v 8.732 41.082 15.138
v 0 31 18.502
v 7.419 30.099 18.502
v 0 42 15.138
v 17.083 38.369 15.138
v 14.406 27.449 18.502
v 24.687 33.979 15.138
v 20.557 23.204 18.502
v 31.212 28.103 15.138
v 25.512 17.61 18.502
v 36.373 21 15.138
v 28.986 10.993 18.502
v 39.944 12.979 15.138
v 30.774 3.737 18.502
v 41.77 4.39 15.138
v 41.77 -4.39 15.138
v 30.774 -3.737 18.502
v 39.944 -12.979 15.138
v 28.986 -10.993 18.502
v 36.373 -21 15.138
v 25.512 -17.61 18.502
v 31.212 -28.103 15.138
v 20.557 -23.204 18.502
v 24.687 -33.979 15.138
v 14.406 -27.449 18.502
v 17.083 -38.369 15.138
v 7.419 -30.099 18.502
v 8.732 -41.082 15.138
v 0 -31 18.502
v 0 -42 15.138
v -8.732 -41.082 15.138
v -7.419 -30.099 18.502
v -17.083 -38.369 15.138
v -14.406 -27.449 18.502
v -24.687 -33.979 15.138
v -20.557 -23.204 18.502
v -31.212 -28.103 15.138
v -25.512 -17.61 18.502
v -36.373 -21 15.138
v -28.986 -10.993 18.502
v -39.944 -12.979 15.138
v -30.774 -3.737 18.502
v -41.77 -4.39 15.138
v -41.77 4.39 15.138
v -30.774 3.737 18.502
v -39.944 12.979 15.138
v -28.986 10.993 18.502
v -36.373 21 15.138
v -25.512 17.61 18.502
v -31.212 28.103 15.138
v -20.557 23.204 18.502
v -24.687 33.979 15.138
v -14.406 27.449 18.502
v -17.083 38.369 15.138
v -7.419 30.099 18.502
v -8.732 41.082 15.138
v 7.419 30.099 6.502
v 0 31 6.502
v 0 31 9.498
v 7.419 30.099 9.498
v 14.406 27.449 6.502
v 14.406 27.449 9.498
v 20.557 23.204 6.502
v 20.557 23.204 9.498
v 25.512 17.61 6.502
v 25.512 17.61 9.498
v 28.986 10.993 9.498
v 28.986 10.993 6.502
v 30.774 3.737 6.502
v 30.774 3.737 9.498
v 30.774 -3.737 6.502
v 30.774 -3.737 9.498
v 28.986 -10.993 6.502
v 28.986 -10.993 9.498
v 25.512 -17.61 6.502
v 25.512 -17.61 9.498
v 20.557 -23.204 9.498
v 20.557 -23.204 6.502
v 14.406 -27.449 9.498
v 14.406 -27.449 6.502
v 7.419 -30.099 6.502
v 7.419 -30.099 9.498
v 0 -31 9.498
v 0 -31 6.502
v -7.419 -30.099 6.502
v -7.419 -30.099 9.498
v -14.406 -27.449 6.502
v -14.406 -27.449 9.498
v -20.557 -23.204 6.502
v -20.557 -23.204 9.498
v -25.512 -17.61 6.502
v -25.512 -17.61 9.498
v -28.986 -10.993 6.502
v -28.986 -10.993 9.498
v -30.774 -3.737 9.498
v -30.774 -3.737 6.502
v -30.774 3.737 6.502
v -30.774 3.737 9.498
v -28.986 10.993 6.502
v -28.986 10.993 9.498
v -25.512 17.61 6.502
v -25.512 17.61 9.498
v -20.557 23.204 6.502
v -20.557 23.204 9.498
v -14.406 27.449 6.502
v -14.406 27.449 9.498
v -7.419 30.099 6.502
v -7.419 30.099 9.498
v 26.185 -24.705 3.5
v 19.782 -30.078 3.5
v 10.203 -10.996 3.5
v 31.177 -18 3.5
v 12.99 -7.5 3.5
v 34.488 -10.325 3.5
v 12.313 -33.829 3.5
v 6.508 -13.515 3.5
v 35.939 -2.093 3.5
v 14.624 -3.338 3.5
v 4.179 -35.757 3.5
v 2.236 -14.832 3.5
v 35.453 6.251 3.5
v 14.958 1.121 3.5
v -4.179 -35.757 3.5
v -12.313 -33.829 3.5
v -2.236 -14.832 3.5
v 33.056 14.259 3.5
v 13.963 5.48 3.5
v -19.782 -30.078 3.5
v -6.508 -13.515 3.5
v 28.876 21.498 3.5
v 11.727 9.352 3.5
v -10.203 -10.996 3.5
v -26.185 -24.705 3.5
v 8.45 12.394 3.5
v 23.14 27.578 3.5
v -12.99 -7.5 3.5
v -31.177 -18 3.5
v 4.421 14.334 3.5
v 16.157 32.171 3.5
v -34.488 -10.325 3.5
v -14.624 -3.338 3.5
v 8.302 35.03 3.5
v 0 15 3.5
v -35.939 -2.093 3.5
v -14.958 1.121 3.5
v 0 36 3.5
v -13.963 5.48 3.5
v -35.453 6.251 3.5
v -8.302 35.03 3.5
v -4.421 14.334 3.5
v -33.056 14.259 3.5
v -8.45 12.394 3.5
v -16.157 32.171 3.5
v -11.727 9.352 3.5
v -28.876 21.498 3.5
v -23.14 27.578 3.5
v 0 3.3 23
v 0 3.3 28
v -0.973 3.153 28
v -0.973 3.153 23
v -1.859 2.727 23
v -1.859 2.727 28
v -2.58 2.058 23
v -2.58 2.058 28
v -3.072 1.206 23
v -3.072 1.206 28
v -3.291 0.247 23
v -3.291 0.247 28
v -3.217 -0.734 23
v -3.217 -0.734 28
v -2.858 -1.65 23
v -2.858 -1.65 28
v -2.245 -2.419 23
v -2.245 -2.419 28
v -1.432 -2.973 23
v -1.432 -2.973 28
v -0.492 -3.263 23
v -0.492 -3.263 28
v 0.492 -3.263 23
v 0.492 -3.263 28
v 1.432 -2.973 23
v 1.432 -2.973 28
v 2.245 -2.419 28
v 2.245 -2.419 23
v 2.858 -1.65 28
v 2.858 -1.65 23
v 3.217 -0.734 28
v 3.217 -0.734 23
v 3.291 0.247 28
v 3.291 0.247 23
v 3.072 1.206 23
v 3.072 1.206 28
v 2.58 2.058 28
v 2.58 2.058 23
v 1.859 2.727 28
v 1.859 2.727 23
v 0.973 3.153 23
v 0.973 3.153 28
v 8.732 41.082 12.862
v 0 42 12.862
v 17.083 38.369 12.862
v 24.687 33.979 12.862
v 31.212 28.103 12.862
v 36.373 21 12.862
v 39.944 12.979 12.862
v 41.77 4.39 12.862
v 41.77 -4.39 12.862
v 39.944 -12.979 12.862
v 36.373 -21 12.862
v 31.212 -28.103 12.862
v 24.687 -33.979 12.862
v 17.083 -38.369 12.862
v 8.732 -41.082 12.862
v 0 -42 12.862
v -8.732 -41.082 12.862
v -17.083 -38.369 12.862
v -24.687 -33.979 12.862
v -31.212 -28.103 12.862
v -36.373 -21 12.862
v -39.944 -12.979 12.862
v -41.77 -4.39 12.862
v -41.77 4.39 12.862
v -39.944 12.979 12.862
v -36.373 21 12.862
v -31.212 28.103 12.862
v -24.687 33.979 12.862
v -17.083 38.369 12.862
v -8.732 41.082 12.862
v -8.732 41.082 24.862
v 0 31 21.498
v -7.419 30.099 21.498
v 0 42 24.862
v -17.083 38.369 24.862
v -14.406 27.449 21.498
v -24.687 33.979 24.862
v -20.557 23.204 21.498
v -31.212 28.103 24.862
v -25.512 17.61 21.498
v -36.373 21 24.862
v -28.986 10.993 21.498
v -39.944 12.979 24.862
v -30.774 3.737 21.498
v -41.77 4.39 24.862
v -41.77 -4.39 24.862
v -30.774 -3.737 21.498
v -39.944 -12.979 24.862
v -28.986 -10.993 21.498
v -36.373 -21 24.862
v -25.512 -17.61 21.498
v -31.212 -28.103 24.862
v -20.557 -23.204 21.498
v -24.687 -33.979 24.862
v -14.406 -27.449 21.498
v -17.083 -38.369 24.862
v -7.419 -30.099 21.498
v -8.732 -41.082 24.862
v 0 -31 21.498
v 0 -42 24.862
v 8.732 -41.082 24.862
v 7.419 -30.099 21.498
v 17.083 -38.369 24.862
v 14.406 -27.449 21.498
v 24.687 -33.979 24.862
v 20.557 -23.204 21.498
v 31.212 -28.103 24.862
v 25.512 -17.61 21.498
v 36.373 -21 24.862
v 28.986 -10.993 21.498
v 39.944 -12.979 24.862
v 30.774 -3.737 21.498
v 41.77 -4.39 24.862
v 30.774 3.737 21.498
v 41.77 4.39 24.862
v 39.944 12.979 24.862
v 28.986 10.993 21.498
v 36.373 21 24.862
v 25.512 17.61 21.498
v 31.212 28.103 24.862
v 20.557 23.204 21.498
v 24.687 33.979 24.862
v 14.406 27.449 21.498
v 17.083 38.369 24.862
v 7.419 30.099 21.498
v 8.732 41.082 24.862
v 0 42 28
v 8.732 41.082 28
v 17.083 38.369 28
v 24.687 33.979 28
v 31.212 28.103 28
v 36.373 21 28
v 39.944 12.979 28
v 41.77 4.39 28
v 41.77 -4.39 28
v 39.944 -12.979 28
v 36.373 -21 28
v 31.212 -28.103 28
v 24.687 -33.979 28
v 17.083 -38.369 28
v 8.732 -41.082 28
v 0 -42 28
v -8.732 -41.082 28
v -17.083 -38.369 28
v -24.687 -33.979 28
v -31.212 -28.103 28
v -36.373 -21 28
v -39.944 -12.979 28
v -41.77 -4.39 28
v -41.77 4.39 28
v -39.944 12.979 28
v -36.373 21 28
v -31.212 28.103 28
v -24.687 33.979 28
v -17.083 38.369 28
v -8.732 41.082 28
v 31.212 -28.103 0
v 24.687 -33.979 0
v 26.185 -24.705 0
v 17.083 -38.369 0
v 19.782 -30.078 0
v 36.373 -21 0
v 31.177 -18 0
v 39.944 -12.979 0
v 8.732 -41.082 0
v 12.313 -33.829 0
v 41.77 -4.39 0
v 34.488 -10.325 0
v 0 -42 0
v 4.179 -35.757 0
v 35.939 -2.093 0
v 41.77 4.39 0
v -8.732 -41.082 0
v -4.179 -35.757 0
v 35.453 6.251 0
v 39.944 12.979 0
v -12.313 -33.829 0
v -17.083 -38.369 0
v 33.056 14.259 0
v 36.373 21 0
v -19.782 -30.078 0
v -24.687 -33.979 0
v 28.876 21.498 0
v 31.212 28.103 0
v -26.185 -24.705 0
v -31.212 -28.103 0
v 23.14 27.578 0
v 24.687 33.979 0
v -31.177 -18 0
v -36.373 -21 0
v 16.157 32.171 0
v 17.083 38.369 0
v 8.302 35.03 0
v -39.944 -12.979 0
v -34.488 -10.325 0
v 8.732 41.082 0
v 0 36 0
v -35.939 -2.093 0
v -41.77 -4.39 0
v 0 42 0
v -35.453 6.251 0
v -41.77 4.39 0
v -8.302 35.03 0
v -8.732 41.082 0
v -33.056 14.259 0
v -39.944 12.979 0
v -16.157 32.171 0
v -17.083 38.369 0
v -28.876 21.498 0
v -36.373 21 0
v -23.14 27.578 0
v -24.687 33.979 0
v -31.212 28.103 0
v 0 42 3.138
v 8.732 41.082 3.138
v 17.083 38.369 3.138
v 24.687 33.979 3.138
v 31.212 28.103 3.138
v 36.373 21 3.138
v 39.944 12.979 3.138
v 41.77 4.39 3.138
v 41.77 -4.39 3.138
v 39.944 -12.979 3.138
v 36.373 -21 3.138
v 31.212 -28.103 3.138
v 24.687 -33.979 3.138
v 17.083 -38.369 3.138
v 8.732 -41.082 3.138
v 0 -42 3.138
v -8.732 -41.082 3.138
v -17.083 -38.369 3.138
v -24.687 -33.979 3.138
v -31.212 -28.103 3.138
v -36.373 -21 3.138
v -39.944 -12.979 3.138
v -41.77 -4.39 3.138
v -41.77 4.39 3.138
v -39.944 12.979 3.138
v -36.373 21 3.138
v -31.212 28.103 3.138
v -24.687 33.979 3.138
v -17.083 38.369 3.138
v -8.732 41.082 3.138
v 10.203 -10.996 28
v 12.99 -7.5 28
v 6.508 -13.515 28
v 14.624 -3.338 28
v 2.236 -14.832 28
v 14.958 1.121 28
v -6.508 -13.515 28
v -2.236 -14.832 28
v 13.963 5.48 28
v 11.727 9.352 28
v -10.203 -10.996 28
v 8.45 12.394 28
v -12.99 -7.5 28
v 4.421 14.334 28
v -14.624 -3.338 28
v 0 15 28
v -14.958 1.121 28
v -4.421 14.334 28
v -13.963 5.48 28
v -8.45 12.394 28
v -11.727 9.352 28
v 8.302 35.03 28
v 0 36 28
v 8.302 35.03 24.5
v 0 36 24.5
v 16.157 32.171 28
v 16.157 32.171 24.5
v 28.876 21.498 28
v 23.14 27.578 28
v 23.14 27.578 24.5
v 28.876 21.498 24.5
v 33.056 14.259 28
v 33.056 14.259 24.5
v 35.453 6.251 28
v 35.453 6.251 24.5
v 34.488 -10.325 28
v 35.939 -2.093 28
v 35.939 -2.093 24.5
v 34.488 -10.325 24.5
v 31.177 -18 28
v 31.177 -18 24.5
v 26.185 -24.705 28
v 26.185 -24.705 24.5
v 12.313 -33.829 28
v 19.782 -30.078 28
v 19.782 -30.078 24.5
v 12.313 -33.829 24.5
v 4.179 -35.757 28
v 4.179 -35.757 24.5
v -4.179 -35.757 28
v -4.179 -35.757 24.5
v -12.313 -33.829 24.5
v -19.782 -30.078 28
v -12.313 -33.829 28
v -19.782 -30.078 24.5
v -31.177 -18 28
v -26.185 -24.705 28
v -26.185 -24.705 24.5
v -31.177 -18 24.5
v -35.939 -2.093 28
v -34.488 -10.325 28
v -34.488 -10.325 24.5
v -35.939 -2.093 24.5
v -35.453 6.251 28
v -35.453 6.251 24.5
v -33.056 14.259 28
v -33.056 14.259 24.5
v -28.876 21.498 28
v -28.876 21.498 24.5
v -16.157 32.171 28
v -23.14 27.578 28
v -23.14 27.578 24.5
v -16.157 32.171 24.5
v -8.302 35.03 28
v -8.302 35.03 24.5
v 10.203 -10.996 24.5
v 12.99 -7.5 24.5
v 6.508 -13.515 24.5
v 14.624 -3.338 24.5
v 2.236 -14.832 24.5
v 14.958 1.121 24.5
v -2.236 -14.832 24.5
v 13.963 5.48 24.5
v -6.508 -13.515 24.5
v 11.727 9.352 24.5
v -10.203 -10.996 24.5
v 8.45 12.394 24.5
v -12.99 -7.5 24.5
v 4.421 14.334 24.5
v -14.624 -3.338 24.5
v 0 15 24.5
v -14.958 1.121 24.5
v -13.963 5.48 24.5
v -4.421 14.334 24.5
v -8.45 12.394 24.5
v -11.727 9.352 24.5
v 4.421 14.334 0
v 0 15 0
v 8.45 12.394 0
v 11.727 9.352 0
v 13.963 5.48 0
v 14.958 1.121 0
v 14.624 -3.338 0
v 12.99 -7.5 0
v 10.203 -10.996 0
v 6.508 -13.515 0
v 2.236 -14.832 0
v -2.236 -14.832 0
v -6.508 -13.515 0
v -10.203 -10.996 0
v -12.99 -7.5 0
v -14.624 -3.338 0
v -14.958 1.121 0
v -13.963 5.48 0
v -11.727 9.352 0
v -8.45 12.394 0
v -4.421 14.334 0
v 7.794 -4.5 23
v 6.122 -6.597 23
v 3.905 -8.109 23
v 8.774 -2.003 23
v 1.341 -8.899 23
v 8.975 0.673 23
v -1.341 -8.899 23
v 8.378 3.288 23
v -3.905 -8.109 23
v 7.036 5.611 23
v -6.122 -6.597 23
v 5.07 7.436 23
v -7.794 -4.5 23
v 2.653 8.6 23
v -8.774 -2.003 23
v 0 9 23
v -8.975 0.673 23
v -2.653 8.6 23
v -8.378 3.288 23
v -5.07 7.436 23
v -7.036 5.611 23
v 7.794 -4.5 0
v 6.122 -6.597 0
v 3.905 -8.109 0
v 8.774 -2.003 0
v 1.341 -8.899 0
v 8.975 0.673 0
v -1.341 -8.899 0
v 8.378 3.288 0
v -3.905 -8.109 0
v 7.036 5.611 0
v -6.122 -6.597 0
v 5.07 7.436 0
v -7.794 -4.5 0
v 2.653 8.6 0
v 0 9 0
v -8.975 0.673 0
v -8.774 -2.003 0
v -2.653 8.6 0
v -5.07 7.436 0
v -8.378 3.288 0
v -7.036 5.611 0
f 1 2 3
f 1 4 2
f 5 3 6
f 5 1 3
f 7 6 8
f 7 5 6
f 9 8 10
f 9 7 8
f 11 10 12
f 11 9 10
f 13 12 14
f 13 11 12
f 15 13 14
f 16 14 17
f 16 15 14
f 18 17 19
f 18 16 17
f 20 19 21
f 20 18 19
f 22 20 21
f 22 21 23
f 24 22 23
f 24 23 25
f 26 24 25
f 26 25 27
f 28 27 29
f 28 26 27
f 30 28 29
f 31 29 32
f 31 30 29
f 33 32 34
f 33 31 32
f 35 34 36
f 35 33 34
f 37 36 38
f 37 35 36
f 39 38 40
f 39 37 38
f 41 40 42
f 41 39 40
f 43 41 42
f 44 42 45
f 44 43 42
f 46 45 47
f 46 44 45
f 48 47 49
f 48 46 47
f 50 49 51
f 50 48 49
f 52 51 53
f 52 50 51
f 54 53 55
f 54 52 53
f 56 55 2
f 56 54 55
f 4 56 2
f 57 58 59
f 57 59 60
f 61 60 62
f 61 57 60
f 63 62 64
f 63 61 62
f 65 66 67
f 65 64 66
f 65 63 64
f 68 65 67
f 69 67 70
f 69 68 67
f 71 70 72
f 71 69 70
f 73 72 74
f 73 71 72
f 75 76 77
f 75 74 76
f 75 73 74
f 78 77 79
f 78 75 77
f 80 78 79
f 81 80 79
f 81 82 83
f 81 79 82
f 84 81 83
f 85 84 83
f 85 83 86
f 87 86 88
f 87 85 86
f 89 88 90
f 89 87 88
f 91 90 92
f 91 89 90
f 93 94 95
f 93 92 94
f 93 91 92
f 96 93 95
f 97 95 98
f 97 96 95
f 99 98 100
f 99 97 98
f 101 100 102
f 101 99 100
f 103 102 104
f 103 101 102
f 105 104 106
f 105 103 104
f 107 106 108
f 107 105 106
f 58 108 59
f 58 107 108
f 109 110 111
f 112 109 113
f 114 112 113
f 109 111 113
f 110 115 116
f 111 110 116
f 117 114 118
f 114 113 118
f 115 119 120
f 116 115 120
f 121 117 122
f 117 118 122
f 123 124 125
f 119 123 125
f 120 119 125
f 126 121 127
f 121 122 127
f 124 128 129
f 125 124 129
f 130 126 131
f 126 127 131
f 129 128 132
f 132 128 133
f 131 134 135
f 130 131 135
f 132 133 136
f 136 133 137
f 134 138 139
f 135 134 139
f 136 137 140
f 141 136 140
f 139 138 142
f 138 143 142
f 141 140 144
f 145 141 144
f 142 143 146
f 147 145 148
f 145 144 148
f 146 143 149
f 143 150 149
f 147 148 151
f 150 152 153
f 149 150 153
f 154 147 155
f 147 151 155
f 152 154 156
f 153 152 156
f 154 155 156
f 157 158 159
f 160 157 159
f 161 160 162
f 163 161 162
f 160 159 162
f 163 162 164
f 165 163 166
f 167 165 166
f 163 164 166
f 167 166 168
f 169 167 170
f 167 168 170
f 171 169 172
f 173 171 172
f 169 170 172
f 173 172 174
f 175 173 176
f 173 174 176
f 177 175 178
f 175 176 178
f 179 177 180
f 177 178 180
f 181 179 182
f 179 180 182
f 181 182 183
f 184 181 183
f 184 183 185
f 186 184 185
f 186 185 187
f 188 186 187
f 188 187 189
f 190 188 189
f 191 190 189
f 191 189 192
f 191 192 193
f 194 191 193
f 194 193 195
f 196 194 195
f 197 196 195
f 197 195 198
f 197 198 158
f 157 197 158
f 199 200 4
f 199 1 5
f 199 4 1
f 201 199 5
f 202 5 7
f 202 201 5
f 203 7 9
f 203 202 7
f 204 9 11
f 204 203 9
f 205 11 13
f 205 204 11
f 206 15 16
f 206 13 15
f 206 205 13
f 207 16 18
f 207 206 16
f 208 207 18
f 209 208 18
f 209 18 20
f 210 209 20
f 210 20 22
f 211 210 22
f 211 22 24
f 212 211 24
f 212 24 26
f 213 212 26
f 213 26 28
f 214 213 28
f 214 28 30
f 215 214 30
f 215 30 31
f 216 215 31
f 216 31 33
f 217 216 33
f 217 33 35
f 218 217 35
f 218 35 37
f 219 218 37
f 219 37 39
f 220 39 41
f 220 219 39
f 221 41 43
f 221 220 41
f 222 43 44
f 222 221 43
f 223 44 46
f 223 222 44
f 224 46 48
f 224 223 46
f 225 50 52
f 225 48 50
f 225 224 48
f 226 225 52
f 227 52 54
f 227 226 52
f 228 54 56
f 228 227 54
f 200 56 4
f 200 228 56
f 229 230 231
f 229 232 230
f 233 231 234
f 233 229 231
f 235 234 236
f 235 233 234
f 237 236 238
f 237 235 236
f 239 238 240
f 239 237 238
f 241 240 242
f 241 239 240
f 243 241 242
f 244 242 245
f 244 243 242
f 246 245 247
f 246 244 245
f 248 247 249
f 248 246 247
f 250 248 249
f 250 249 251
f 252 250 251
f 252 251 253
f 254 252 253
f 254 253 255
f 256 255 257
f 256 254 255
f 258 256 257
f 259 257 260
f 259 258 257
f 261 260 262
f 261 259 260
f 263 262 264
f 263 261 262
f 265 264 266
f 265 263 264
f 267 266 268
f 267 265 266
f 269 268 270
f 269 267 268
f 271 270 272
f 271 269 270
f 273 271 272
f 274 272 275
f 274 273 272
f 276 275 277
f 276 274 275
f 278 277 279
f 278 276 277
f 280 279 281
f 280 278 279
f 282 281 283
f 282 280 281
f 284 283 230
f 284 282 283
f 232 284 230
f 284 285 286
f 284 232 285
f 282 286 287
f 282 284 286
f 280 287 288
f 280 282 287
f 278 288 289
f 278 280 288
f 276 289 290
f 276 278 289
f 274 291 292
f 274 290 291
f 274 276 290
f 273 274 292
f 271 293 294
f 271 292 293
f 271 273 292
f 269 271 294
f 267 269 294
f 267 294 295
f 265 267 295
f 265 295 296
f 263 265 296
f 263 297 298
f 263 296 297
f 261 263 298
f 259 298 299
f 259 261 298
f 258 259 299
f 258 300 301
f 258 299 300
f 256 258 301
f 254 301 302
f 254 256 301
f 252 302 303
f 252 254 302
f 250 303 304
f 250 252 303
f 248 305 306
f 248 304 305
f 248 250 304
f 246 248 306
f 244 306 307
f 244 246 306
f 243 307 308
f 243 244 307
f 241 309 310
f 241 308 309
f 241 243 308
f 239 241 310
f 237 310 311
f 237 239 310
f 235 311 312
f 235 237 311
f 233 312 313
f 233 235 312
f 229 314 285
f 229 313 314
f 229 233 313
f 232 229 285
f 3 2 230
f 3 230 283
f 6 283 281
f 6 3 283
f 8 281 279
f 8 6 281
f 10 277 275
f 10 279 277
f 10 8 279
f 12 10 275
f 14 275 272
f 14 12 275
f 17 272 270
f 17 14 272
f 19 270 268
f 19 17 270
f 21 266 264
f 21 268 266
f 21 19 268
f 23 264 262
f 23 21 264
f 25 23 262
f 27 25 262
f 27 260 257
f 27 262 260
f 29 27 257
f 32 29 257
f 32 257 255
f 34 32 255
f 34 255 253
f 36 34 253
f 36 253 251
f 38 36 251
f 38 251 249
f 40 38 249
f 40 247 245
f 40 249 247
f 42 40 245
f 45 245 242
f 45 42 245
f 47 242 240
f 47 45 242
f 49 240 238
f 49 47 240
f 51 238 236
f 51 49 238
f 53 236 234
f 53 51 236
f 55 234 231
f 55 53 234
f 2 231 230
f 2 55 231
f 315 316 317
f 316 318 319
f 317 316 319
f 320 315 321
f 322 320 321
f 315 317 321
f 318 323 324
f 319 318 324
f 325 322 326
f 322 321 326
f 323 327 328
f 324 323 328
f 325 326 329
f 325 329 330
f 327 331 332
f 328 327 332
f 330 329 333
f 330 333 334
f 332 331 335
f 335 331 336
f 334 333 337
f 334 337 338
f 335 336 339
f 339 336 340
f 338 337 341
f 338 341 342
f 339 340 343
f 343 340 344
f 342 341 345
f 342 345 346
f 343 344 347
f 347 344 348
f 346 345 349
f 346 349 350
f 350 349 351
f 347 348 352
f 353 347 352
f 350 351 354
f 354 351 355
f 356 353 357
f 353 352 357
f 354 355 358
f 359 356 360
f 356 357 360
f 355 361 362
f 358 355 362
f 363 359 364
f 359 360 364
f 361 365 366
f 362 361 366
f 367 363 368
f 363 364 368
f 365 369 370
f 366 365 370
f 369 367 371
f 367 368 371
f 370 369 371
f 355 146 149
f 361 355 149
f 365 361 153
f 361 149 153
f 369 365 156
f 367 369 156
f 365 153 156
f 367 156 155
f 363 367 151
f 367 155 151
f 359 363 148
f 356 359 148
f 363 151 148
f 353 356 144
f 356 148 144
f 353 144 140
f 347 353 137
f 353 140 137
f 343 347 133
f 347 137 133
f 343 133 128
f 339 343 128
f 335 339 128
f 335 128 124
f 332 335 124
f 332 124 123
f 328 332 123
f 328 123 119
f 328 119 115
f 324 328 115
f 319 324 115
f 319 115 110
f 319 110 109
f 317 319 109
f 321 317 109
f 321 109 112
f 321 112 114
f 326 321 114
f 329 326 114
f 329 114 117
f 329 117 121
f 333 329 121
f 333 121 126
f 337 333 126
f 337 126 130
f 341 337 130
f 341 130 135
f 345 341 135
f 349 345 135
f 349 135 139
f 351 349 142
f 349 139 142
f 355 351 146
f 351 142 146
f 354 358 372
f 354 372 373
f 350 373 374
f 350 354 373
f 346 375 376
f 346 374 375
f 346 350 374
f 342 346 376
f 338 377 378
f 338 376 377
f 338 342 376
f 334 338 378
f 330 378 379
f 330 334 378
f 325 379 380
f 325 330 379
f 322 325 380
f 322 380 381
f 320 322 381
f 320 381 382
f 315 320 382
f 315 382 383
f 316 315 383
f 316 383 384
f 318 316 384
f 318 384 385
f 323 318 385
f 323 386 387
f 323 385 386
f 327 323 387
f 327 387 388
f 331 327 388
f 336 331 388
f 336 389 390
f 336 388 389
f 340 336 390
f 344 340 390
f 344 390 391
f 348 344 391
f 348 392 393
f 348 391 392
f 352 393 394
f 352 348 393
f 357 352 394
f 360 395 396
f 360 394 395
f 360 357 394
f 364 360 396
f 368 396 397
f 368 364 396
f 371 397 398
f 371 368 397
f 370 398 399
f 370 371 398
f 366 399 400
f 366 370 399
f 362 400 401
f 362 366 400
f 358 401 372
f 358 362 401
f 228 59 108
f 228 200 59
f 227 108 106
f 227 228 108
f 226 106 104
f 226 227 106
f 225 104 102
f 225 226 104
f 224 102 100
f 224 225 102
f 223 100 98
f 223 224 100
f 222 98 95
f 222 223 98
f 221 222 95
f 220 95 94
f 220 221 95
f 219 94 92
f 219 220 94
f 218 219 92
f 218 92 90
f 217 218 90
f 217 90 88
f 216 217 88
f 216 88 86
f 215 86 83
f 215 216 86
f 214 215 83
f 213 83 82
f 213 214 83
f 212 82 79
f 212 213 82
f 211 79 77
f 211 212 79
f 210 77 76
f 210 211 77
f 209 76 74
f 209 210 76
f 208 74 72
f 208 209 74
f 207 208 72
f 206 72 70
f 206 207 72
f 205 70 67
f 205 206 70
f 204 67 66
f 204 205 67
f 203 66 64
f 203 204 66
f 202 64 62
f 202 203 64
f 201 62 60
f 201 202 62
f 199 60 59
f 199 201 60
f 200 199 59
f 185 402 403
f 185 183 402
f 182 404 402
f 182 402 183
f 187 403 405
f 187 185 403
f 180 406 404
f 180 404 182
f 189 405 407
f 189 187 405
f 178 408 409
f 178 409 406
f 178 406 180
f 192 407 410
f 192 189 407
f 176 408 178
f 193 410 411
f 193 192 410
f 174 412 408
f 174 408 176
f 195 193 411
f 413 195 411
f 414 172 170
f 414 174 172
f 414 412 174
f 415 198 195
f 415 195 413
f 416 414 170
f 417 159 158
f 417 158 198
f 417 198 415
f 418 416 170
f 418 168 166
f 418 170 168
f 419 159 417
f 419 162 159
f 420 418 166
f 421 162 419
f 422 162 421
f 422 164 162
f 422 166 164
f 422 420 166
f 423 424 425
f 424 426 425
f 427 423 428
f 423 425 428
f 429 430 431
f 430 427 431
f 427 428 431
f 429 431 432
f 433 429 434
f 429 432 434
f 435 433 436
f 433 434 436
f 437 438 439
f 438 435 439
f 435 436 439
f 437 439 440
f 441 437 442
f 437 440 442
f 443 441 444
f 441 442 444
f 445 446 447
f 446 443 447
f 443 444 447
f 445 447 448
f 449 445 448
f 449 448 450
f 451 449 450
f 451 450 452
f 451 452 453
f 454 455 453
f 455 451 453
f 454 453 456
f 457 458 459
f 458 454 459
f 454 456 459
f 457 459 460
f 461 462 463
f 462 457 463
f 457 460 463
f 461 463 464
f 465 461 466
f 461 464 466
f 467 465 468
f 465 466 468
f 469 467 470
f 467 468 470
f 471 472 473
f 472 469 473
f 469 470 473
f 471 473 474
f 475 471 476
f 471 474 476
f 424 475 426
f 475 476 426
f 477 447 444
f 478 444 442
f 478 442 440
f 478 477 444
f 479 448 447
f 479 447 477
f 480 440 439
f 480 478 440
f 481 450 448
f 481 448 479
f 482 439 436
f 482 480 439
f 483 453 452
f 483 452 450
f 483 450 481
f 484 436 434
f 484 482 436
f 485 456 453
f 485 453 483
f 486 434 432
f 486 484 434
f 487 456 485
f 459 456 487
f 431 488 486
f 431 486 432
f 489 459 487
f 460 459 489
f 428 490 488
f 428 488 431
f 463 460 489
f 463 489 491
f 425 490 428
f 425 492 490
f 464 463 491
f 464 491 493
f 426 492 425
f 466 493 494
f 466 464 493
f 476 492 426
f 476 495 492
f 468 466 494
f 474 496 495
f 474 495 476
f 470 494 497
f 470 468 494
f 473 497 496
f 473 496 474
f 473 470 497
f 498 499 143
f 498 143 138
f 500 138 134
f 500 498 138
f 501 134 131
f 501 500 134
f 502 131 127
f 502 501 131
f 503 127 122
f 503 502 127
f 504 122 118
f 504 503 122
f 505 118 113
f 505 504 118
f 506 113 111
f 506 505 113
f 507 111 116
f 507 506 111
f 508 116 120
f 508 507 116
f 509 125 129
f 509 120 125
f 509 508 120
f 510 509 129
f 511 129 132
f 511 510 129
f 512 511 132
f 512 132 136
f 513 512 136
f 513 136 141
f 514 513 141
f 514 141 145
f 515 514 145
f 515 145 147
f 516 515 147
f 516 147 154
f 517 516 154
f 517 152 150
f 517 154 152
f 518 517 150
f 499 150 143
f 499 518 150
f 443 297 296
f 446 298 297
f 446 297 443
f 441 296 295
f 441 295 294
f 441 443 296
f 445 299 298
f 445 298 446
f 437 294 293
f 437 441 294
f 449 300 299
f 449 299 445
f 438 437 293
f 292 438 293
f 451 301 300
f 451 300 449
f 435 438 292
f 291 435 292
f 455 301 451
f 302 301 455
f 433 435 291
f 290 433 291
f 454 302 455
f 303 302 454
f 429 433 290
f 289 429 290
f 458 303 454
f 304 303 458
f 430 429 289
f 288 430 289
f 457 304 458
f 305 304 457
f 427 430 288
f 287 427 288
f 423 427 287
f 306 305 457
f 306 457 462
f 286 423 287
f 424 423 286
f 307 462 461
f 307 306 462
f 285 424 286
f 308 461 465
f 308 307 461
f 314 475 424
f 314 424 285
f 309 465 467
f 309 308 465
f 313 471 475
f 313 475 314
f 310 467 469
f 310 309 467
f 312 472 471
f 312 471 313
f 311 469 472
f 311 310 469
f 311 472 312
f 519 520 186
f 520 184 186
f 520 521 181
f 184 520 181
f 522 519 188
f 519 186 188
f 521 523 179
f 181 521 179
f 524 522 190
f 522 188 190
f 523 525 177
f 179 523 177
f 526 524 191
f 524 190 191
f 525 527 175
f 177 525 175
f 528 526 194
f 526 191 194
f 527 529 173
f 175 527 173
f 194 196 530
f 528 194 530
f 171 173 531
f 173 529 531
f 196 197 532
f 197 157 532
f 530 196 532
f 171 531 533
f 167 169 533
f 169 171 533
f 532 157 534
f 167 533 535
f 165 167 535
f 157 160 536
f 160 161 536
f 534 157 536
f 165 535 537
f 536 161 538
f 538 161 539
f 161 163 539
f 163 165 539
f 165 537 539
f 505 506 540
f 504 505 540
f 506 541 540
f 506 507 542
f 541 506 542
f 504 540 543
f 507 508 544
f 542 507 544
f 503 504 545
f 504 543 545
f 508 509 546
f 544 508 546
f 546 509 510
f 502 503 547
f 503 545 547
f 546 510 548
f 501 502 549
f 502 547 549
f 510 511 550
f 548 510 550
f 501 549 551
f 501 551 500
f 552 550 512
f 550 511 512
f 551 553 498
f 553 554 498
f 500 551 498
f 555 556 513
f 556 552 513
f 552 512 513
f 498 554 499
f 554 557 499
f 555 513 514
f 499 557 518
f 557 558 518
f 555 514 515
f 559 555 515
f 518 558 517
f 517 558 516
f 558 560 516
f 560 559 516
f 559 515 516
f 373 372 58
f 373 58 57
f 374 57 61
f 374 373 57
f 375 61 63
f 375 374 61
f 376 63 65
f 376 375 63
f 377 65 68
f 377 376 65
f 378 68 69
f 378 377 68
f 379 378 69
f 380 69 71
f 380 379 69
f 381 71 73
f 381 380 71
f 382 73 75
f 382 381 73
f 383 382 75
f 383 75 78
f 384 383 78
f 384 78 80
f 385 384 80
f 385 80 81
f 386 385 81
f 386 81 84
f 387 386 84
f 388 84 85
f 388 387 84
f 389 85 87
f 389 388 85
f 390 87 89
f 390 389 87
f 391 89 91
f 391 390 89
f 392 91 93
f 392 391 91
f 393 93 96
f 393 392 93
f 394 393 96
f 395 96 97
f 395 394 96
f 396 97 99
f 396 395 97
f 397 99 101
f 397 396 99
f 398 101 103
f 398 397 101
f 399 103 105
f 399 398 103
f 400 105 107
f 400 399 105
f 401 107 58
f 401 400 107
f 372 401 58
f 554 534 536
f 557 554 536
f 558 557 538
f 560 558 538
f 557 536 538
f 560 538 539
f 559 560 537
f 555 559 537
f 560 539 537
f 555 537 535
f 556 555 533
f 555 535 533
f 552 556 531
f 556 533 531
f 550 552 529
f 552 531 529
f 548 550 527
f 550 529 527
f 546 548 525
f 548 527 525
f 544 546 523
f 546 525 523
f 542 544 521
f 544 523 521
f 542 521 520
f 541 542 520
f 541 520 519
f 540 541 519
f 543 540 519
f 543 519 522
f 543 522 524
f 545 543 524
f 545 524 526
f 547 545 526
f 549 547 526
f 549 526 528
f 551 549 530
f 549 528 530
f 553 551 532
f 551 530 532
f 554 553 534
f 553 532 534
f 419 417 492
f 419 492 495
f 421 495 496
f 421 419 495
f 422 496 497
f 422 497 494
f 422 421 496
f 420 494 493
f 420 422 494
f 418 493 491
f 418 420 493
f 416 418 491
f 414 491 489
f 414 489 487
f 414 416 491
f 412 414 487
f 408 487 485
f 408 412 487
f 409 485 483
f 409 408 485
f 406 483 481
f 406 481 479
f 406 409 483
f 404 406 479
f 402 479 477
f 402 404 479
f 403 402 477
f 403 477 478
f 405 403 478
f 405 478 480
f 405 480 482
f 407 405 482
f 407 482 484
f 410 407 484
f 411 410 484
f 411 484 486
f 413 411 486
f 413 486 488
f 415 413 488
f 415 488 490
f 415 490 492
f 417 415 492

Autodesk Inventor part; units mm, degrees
ref_plane "YZ Plane" through (0, 0, 0) normal (1, 0, 0) x (0, 1, 0)
ref_plane "XZ Plane" through (0, 0, 0) normal (0, 1, 0) x (-1, 0, 0)
sketch "Main Sketch" plane through (0, 0, 0) normal (1, 0, 0) x (0, 1, 0)
  line L0 (0, 28) -> (42, 28)
  line L1 (42, 28) -> (42, 12.8615)
  line L2 (42, 12.8615) -> (31, 9.4984)
  line L3 (31, 9.4984) -> (31, 6.5016)
  line L4 (31, 6.5016) -> (42, 3.1385)
  line L5 (42, 3.1385) -> (42, 0)
  line L6 (42, 0) -> (0, 0)
  line L7 (40, 12.25) -> (40, 3.75) construction
  line L8 (31, 8) -> (40, 8) construction
  line L9 (42, 12.8615) -> (42, 3.1385)
  line L10 (0, -5.6) -> (0, 33.6) projected
  line L11 (0, 0) -> (0, 28)
  line L12 (36, 0) -> (36, 3.5)
  line L13 (36, 3.5) -> (15, 3.5)
  line L14 (15, 3.5) -> (15, 0)
  line L15 (36, 28) -> (36, 24.5)
  line L16 (36, 24.5) -> (15, 24.5)
  line L17 (15, 24.5) -> (15, 28)
  dimension "d0" = 8.5
  dimension "d1" = 34
  dimension "d2" = 2
  dimension "d6" = 28
  dimension "d21" = 80
  dimension "d25" = 11
  dimension "d27" = 8
  dimension "d35" = 6
  dimension "d36" = 15
  dimension "d37" = 3.5
ref_plane "Belt Plane" through (0, 31, 8) normal (0, 0, 1) x (1, 0, 0)
revolve "Body" add sketch "Main Sketch" angle 360 about axis through (0, 0, -10) along (0, 0, 1) contours L0 L17 L16 L15 L1 L2 L3 L4 L5 L6 L12 L13 L14 L10 | L9 L4 L3 L2
revolve "Groove" cut sketch "Main Sketch" angle 360 about axis through (0, 0, -10) along (0, 0, 1) contours L9 L4 L3 L2
fillet "Fillet External" [suppressed]
fillet "Fillet Internal" [suppressed]
pattern_linear "Groove Pattern" count 2 spacing 12 along (0, 0, 1) of "Groove"
sketch "Sketch2" plane through (0, 0, 0) normal (0, 0, -1) x (-1, 0, 0)
  circle A0 centre (0, 0) radius 42 projected
hole "Hole1" at (0, 0, 0) direction (0, 0, 1) diameter 6.6 end through all counterbore diameter 18 counterbore depth 23
equation "\"d0\" = da_Bw"
equation "\"d1\" = da_Alfa"
equation "\"d2\" = da_c"
equation "\"d21\" = da_Dw"
equation "\"d25\" = da_Hd"
equation "\"d27\" = da_Se"
equation "\"da_r1\" = 0"
equation "\"da_r2\" = 0"
equation "\"d18\" = da_Sg"
equation "\"d5\" = da_Se"
equation "\"da_Bw\" = 8.5"
equation "\"da_Alfa\" = 34deg"
equation "\"da_c\" = 2"
equation "\"da_Dw\" = 80"
equation "\"da_Hd\" = 11"
equation "\"da_Se\" = 8"
equation "\"da_Sg\" = 12"
properties part number "PWTR-0096" material "Stainless Steel"
